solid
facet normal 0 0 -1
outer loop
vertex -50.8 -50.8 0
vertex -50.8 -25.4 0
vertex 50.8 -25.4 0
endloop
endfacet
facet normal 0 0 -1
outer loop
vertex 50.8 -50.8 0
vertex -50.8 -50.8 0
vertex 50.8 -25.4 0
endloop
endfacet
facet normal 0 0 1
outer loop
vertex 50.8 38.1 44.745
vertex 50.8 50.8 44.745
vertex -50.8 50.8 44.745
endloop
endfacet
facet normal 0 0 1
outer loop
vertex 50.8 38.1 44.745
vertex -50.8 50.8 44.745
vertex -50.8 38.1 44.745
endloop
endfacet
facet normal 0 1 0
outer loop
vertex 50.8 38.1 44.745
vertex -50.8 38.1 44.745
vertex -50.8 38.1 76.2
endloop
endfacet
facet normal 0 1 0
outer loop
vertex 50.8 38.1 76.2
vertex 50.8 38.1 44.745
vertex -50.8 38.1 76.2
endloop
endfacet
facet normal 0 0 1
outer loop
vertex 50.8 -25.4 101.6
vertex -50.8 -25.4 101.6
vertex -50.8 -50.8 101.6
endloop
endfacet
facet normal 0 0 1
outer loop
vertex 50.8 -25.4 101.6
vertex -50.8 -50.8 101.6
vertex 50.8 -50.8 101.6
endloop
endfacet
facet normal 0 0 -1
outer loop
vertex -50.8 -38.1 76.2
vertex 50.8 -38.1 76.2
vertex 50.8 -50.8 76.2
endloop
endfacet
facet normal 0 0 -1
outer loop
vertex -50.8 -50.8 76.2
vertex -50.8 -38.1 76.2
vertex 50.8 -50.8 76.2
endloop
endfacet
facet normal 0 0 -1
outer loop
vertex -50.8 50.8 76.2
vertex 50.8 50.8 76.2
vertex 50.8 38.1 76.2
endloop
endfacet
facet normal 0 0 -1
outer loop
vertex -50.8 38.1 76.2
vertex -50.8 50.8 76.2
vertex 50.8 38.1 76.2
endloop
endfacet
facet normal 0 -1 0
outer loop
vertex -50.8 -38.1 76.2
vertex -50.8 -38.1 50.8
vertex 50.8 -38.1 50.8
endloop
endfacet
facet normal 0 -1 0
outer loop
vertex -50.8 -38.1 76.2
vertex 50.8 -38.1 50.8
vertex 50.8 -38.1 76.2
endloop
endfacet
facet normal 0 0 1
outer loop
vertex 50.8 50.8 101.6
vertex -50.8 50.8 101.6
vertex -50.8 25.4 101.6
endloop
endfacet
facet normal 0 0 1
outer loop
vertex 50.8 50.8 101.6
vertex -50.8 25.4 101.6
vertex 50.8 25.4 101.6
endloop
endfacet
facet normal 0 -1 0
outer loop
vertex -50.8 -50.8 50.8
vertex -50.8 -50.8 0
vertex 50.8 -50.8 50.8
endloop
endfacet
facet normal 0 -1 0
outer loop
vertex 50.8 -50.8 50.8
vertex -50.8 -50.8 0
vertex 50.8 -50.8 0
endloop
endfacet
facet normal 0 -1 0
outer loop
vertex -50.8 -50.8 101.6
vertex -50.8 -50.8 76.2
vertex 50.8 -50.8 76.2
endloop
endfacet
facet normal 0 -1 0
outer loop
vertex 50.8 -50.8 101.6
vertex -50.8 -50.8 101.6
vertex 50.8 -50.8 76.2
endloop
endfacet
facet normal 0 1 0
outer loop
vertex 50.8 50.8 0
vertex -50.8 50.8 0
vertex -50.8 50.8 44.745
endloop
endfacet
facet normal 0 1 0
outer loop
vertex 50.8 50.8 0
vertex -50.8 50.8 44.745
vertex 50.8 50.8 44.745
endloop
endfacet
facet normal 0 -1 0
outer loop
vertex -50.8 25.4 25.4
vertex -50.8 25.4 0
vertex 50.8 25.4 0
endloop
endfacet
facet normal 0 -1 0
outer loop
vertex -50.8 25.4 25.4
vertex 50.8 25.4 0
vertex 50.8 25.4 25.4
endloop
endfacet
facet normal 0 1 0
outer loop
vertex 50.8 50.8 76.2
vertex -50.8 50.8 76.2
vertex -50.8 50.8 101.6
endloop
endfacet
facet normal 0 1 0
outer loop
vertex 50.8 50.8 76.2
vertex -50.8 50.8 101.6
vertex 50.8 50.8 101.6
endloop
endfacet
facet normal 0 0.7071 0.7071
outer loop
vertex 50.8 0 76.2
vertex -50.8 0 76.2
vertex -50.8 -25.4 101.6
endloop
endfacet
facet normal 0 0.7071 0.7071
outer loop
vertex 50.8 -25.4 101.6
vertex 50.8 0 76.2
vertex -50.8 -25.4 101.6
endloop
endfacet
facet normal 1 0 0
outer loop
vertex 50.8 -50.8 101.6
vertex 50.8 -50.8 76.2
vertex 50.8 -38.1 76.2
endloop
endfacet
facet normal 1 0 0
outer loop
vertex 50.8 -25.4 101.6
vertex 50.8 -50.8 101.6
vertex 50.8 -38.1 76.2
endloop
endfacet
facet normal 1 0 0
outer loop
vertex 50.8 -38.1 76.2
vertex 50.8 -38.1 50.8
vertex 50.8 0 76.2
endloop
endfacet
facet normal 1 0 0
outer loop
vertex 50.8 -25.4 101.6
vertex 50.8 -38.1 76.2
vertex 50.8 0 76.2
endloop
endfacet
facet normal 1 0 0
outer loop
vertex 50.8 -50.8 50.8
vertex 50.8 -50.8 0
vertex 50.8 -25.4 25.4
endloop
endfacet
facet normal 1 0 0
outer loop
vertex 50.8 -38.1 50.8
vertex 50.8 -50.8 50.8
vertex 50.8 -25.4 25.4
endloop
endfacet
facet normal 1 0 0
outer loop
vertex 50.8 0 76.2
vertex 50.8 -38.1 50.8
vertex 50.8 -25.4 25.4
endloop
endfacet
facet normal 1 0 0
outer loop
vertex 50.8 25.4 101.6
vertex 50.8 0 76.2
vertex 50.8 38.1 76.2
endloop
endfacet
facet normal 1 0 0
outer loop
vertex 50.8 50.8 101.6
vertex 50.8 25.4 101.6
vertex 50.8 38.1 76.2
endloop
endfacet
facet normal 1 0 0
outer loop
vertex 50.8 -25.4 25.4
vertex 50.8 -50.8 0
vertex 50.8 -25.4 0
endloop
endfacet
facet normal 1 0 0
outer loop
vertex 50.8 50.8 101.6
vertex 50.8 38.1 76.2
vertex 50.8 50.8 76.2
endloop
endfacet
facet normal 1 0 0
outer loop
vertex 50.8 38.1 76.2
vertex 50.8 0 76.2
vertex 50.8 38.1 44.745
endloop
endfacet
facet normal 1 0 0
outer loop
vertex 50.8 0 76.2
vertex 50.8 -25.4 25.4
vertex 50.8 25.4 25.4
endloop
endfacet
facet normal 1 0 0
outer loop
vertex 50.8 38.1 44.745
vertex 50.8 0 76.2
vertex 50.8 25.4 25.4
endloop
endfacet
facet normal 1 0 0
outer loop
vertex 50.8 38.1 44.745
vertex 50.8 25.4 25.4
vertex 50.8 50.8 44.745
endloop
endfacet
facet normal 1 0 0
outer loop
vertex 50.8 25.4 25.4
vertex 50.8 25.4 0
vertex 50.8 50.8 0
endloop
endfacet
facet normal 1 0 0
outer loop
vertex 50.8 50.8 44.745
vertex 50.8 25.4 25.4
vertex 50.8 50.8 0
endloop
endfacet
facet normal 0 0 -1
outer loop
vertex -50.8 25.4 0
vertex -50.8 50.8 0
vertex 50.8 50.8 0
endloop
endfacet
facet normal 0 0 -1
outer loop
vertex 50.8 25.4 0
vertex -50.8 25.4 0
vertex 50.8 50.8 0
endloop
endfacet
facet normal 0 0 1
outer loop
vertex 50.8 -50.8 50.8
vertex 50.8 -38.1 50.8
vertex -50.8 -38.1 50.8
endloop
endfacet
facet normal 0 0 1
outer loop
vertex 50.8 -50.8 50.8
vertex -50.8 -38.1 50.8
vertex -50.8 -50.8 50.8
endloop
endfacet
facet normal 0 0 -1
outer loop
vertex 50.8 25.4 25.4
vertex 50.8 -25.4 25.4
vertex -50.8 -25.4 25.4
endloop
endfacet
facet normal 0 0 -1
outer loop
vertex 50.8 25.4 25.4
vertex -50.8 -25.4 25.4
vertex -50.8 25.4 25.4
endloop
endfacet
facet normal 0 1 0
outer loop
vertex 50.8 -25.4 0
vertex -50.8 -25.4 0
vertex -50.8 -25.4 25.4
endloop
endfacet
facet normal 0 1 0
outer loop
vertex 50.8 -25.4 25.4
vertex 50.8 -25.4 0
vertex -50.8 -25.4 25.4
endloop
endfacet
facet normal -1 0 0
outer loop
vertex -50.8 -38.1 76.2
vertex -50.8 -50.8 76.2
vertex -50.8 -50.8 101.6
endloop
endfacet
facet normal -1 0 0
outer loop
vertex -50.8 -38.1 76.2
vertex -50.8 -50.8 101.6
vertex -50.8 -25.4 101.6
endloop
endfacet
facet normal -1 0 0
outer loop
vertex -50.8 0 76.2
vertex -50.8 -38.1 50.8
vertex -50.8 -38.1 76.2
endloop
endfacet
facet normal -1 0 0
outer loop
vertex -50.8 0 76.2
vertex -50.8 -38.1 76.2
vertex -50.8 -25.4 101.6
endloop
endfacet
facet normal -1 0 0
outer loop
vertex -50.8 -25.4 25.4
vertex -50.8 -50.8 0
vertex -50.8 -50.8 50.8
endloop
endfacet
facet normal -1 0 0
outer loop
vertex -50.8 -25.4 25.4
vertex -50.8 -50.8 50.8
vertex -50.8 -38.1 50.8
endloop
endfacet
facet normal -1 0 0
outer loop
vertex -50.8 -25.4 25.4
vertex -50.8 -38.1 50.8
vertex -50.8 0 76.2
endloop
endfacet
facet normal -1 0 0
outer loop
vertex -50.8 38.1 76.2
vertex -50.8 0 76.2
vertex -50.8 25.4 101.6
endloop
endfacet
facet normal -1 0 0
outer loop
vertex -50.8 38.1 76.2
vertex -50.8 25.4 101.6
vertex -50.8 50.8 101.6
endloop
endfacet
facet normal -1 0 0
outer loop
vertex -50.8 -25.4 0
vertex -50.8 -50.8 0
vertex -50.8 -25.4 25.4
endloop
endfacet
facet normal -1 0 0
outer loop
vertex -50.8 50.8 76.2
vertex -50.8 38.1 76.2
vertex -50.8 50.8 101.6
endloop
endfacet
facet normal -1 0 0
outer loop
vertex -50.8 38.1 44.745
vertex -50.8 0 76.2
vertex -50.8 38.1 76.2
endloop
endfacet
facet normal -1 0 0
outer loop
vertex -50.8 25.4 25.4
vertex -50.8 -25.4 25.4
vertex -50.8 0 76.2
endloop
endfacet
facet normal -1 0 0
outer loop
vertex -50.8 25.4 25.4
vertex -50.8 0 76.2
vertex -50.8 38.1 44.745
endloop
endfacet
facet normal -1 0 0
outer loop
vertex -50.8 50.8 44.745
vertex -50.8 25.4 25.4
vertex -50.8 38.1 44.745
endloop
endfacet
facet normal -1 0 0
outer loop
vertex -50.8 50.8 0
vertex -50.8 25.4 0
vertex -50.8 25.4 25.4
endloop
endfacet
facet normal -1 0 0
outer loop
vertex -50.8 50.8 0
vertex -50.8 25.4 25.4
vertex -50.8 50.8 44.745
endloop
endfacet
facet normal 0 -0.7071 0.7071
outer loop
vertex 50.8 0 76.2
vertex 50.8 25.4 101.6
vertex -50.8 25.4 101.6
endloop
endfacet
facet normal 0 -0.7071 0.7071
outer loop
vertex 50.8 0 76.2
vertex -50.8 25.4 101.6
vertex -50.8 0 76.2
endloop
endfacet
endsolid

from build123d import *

# Parameters (mm, degrees)
F0_W     = 101.6
F0_H     = 101.6
F1_DEPTH = 101.6
F2_W     = 12.7
F2_H     = 31.454976
F2_H_2   = 25.4
F2_W_2   = 25.4
F3_DEPTH = 101.6
F5_DEPTH = 101.6


with BuildPart() as f1:
    # F0 (on Top) → F1 (new body)
    with BuildSketch(Plane.XY):
        Rectangle(F0_W, F0_H)
    extrude(amount=F1_DEPTH)

    # F2 (on face) → F3 (cut)
    with BuildSketch(Plane(origin=(-50.8, 0, 0), x_dir=(0, -1, 0), z_dir=(-1, 0, 0))):
        with Locations((-44.45, 60.472512)):
            Rectangle(F2_W, F2_H)
        with Locations((44.45, 63.5)):
            Rectangle(F2_W, F2_H_2)
        with Locations((-12.7, 12.7)):
            Rectangle(F2_W_2, F2_H_2)
        with Locations((12.7, 12.7)):
            Rectangle(F2_W_2, F2_H_2)
    extrude(amount=-F3_DEPTH, mode=Mode.SUBTRACT)

    # F4 (on face) → F5 (cut)
    with BuildSketch(Plane(origin=(-50.8, 0, 0), x_dir=(0, -1, 0), z_dir=(-1, 0, 0))):
        Polygon((0, 101.6), (-25.4, 101.6), (0, 76.2), align=None)
        Polygon((25.4, 101.6), (0, 101.6), (0, 76.2), align=None)
    extrude(amount=-F5_DEPTH, mode=Mode.SUBTRACT)


solid = f1.part
